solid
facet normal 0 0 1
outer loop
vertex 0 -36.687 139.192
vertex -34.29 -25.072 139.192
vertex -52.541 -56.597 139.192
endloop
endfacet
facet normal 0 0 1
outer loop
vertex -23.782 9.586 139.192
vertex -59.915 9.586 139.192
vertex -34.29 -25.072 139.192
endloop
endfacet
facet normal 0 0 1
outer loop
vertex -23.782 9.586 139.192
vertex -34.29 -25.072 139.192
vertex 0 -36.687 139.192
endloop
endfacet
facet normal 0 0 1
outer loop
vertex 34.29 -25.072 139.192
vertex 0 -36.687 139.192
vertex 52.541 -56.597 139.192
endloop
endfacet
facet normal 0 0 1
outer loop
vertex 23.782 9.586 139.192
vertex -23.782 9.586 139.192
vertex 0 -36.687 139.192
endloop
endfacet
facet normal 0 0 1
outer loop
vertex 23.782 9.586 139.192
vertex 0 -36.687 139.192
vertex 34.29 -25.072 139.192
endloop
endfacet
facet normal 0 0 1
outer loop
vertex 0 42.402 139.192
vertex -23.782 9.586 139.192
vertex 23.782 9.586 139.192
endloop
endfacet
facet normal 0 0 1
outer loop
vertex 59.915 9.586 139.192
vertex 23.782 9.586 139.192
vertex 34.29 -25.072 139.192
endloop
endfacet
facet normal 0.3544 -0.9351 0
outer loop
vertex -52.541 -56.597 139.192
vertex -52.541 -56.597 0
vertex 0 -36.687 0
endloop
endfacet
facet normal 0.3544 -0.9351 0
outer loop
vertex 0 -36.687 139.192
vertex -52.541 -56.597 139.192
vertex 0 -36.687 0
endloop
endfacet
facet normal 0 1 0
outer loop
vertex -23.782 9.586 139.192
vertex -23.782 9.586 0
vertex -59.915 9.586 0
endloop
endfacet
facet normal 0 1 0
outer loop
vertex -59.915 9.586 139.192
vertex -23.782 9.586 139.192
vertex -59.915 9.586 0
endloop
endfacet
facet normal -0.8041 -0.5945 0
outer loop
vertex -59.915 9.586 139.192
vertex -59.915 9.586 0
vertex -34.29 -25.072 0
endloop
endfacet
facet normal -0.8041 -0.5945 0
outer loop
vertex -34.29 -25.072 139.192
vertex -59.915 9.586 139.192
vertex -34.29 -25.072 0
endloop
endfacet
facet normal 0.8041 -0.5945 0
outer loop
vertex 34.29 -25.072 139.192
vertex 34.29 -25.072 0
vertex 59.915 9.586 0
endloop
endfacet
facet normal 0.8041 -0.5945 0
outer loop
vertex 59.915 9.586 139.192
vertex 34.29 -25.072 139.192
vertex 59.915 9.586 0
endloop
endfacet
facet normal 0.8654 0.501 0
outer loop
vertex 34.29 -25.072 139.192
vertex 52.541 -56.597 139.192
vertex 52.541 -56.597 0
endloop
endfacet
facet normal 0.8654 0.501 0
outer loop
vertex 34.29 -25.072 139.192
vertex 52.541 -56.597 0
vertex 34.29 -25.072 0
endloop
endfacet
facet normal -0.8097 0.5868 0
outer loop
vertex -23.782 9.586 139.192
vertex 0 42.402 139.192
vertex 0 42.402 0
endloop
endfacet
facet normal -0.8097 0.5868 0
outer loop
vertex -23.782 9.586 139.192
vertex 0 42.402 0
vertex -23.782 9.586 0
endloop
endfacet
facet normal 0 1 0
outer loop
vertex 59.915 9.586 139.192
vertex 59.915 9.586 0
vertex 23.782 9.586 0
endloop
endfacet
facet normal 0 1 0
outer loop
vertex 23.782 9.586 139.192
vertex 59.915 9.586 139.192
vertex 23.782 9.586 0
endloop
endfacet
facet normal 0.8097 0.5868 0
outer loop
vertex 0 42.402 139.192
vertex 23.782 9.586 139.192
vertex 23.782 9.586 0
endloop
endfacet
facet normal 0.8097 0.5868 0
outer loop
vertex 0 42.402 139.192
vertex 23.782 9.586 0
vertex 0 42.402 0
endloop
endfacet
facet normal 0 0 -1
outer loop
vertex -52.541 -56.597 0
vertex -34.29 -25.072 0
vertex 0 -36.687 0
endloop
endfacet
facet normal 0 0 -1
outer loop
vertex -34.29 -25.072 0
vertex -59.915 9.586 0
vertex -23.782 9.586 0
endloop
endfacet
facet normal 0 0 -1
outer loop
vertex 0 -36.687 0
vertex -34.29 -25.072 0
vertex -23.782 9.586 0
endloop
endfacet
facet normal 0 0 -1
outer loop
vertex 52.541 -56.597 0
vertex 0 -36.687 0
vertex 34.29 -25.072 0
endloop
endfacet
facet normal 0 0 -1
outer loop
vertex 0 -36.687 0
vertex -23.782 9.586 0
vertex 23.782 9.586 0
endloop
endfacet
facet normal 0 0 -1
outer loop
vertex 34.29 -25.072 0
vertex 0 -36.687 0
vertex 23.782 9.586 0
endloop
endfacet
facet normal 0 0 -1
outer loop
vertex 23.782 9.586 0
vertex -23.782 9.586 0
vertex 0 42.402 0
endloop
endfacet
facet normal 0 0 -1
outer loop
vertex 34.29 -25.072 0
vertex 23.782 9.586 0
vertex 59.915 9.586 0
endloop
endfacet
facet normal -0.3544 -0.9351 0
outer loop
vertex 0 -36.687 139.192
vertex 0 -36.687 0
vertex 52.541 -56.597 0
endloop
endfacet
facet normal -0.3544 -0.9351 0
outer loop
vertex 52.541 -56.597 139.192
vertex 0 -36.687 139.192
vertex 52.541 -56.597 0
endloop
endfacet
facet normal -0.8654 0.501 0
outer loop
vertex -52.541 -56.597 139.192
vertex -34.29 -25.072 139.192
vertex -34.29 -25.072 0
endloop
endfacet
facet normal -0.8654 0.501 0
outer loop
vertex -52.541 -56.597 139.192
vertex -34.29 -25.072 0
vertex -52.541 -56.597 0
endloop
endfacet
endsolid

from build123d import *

# Parameters (mm, degrees)
F1_DEPTH = 139.192
F2_R     = 27.771384
F3_DEPTH = 135.89
F5_DEPTH = 120.142


with BuildPart() as f1:
    # F0 (on Top) → F1 (new body)
    with BuildSketch(Plane.XY):
        Polygon((23.781775, 9.586452), (0, 42.401612), (-23.781775, 9.586452), (-59.915323, 9.586452), (-34.290001, -25.072258), (-52.541129, -56.596935), (0, -36.686614), (52.541129, -56.596935), (34.290001, -25.072258), (59.915323, 9.586452), align=None)
    extrude(amount=F1_DEPTH)

    # F2 (on face) → F3 (join)
    with BuildSketch(Plane(origin=(0, 0, 0), x_dir=(1, 0, 0), z_dir=(0, 0, -1))):
        with Locations((0, 6.819746)):
            Circle(F2_R)
    extrude(amount=-F3_DEPTH)

    # F4 (on face) → F5 (join)
    with BuildSketch(Plane(origin=(0, 0, 0), x_dir=(1, 0, 0), z_dir=(0, 0, -1))):
        Polygon((-13.642258, -6.452419), (0, -28.943708), (18.066773, -6.452419), (50.69758, -4.424516), (28.574999, 29.128065), (43.692097, 48.300967), (-4.793226, 31.155968), (-41.664194, 49.407098), (-27.837582, 18.619839), (-49.775805, -6.452419), align=None)
    extrude(amount=-F5_DEPTH)


solid = f1.part
